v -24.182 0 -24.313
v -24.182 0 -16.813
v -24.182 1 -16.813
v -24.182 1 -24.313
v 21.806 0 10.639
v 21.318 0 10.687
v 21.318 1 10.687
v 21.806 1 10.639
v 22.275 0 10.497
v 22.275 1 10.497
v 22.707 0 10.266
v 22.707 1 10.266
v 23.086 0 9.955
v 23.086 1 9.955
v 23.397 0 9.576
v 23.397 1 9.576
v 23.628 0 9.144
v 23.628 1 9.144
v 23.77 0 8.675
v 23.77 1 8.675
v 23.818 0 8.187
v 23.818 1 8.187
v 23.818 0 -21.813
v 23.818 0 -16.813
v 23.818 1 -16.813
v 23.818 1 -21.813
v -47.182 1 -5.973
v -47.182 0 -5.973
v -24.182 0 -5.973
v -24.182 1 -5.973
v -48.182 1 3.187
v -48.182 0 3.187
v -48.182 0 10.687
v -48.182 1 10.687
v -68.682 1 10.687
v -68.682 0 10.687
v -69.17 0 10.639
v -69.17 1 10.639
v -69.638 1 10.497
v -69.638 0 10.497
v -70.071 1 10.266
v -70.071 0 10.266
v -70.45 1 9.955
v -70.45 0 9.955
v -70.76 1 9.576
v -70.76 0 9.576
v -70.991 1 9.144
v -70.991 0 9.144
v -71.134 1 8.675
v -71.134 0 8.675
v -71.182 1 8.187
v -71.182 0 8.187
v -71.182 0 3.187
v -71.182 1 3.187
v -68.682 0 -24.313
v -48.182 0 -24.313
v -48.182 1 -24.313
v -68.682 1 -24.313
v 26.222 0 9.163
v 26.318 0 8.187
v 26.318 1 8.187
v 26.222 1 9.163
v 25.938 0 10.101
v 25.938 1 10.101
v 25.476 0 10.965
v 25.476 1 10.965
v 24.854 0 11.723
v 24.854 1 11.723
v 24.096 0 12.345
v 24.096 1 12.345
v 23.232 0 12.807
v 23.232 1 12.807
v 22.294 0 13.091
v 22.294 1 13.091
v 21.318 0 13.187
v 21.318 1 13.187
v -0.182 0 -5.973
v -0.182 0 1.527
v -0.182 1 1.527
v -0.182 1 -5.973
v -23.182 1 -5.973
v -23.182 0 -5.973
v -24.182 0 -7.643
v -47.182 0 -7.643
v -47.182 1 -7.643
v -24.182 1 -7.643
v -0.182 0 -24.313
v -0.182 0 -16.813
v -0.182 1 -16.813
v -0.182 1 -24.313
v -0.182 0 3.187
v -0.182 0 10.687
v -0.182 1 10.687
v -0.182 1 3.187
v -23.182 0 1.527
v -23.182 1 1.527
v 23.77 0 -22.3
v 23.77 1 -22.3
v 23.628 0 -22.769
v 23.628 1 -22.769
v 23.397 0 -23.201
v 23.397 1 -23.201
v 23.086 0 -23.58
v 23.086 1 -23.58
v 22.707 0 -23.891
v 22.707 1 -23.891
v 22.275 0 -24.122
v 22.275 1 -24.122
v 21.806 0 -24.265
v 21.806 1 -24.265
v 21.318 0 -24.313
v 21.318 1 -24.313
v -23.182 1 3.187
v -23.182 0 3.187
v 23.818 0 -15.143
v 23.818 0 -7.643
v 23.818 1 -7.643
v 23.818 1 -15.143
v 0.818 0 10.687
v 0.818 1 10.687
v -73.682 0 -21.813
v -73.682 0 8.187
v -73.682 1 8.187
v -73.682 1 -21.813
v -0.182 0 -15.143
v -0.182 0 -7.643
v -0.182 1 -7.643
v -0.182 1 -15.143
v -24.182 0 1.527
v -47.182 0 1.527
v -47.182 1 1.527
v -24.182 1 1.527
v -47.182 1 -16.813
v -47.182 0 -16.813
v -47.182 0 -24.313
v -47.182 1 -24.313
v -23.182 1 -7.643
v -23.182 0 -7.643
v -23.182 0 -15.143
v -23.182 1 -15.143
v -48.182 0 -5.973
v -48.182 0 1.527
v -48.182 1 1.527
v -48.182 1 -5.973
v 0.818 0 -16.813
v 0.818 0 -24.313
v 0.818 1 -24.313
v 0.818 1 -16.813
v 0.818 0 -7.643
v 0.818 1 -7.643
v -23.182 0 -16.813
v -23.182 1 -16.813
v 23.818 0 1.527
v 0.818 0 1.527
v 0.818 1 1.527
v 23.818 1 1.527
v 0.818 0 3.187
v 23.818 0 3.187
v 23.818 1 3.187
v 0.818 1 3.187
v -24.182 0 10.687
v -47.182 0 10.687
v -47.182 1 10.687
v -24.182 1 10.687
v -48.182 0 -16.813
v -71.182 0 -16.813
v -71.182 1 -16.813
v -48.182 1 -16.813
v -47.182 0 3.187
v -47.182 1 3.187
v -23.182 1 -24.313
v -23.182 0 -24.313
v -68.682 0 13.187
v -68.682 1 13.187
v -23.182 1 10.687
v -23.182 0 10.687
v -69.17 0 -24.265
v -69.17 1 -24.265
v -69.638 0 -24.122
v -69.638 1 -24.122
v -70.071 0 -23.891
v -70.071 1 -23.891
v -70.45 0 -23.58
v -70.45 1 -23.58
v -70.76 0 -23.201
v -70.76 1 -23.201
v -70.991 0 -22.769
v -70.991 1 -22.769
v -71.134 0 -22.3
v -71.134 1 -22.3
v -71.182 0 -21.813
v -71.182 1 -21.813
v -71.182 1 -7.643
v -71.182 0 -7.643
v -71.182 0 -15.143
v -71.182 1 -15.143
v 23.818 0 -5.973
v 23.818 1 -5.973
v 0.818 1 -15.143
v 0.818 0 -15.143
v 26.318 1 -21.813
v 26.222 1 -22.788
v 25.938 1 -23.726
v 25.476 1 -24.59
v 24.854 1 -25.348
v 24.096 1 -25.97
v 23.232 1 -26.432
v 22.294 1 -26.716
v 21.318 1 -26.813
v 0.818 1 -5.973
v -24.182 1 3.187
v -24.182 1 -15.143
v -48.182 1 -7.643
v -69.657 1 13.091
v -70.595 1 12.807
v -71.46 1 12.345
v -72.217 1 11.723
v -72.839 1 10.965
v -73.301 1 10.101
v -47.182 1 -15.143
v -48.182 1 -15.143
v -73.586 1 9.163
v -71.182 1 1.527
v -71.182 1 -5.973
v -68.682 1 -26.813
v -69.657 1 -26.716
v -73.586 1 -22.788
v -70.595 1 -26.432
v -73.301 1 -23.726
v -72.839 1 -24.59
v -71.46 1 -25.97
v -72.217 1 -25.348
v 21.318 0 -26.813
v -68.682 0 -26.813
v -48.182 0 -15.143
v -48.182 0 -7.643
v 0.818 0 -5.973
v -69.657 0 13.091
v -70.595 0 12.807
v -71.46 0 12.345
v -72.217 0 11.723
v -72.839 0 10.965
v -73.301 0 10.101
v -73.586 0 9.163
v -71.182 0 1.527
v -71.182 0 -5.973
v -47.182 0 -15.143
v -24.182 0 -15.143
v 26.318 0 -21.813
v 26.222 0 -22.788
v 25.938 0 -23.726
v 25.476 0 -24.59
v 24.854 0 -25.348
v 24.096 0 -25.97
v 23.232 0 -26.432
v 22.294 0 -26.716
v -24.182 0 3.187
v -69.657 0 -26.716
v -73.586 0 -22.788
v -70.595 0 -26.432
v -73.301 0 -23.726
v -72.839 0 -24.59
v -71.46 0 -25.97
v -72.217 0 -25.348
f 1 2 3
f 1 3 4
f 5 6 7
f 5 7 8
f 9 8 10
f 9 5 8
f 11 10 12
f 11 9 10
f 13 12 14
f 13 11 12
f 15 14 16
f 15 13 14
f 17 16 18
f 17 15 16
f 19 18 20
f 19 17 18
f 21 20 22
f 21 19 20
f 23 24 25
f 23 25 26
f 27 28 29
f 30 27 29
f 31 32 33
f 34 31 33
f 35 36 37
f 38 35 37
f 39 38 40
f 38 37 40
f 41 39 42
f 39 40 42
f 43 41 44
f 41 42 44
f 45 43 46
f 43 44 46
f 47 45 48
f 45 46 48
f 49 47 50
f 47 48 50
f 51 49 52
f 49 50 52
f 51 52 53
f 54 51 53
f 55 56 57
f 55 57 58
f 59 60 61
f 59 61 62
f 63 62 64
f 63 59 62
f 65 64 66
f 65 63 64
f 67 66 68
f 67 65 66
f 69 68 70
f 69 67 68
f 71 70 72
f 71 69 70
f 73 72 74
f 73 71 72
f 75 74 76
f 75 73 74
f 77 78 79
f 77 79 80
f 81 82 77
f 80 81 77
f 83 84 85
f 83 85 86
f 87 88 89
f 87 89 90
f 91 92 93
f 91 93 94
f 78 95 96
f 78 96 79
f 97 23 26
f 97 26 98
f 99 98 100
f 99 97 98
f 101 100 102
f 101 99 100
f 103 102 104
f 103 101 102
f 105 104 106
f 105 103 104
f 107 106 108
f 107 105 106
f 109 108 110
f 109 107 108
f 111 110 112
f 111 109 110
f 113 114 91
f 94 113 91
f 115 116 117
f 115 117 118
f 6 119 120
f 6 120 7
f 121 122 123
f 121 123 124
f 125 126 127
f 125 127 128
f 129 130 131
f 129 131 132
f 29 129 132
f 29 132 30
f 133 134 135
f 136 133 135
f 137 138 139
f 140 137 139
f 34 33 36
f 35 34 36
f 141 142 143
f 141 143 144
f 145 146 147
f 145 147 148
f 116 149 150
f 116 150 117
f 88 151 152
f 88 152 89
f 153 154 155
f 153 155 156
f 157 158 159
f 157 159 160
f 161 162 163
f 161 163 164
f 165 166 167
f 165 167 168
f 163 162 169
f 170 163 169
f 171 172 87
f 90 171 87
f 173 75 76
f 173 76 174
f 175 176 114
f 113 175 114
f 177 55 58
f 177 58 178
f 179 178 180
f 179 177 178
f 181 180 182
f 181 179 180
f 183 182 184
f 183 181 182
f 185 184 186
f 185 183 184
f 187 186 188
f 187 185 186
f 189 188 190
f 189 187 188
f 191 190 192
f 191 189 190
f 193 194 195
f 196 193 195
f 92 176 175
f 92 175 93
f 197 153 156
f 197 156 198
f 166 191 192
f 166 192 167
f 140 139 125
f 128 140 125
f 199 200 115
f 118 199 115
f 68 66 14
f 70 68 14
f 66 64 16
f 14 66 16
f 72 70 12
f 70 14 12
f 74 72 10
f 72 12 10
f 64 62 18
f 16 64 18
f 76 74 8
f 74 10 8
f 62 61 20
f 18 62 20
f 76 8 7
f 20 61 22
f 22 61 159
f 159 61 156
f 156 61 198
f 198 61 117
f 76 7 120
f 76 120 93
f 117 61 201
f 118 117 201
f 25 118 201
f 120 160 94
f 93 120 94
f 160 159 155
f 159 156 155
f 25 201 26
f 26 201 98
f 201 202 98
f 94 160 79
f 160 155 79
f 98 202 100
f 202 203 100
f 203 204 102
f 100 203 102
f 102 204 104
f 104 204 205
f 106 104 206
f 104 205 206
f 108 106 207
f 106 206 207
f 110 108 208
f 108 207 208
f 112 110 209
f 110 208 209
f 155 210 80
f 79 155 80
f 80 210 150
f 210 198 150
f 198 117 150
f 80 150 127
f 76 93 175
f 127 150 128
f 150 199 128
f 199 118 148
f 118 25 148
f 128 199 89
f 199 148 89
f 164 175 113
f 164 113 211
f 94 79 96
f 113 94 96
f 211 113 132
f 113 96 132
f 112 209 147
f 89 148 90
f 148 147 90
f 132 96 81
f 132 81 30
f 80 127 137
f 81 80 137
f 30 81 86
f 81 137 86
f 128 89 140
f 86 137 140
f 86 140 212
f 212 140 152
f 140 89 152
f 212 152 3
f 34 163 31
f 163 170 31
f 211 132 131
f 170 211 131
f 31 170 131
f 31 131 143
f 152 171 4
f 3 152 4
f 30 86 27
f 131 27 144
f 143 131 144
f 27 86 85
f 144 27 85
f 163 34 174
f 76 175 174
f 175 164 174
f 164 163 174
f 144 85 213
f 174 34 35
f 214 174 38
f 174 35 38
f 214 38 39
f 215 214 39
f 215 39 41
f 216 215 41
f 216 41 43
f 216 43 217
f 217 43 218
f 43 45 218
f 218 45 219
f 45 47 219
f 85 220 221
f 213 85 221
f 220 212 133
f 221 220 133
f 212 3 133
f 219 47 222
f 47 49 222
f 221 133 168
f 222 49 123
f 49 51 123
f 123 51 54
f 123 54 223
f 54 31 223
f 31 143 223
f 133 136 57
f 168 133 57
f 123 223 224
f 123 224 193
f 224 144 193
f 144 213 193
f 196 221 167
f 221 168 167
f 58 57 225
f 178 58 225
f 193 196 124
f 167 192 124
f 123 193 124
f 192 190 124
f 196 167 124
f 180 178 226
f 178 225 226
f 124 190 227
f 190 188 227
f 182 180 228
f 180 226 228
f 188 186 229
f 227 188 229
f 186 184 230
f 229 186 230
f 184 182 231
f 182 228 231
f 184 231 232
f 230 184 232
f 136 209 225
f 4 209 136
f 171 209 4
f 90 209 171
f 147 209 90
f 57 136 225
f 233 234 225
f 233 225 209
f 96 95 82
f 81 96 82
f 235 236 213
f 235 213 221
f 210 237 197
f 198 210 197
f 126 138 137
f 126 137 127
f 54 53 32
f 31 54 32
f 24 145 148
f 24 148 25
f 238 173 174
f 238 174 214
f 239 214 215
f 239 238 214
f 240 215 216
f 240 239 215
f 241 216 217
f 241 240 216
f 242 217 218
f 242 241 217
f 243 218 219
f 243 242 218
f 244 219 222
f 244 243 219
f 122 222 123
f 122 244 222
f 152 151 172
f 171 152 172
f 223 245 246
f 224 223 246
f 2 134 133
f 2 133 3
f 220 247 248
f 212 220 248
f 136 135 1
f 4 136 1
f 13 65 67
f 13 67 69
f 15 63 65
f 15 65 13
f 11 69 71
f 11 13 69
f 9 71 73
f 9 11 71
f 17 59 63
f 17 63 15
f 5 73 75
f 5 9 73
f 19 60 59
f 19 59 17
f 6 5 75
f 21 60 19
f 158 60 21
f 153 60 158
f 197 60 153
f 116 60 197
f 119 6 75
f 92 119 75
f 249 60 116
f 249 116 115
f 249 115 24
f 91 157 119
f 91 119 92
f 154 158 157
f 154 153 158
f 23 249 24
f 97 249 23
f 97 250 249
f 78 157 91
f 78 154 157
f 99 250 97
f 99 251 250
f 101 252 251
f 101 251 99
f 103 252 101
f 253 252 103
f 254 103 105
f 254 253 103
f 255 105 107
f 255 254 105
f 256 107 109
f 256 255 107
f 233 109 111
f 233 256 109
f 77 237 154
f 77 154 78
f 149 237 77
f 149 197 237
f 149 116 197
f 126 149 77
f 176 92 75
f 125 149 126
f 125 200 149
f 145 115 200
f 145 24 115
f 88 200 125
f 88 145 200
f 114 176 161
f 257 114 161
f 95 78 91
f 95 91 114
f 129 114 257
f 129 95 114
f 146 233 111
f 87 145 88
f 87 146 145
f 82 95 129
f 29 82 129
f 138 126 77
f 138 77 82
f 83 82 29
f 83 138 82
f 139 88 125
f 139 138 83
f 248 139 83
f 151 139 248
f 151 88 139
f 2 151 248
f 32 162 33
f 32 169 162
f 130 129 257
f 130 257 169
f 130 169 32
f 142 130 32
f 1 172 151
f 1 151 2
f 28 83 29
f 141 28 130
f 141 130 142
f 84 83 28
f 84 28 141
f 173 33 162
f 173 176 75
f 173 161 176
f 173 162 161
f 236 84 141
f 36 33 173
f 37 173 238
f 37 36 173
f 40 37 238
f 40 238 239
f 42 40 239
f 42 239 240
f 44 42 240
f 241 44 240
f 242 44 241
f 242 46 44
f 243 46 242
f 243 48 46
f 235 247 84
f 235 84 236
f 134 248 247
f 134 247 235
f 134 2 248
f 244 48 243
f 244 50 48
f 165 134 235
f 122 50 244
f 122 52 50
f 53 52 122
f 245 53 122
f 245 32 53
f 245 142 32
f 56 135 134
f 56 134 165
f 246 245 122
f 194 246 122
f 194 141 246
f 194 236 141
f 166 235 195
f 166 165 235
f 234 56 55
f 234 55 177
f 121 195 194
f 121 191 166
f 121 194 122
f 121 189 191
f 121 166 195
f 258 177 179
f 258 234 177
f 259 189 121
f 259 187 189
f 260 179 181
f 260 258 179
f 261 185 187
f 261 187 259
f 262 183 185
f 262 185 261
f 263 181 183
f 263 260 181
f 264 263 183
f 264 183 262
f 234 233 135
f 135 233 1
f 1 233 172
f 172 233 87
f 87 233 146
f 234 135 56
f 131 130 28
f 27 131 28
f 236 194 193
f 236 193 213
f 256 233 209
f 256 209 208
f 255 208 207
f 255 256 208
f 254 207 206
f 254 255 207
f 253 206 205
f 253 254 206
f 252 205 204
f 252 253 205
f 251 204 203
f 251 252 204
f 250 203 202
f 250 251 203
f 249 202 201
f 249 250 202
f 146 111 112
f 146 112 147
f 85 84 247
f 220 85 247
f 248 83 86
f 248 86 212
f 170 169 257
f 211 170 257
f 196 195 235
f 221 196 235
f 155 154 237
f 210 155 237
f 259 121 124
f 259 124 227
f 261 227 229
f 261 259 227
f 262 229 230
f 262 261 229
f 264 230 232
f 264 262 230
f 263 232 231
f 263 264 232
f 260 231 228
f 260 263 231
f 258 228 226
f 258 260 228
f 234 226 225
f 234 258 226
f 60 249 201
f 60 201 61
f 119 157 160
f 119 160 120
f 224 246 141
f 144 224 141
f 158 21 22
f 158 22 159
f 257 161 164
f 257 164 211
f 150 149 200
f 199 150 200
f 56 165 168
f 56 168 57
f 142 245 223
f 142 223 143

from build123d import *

# Parameters (mm, degrees)
SKETCH1_W           = 23
SKETCH1_H           = 7.5
BOSS_EXTRUDE1_DEPTH = 1


with BuildPart() as part:
    # Sketch1 → Boss-Extrude1 (new body)
    with BuildSketch(Plane(origin=(0, 0, 0), x_dir=(1, 0, 0), z_dir=(0, 1, 0))):
        with BuildLine():
            Line((-68.681780825, 26.812567087), (21.318219175, 26.812567087))
            ThreePointArc((21.318219175, 26.812567087), (24.853753081, 25.348100993), (26.318219175, 21.812567087))
            Line((26.318219175, 21.812567087), (26.318219175, -8.187432913))
            ThreePointArc((26.318219175, -8.187432913), (24.853753081, -11.722966819), (21.318219175, -13.187432913))
            Line((21.318219175, -13.187432913), (-68.681780825, -13.187432913))
            ThreePointArc((-68.681780825, -13.187432913), (-72.217314731, -11.722966819), (-73.681780825, -8.187432913))
            Line((-73.681780825, -8.187432913), (-73.681780825, 21.812567087))
            ThreePointArc((-73.681780825, 21.812567087), (-72.217314731, 25.348100993), (-68.681780825, 26.812567087))
        make_face()
        with BuildLine():
            Line((-71.181780825, 16.812567087), (-48.181780825, 16.812567087))
            Line((-48.181780825, 16.812567087), (-48.181780825, 24.312567087))
            Line((-48.181780825, 24.312567087), (-68.681780825, 24.312567087))
            ThreePointArc((-68.681780825, 24.312567087), (-70.449547778, 23.58033404), (-71.181780825, 21.812567087))
            Line((-71.181780825, 21.812567087), (-71.181780825, 16.812567087))
        make_face(mode=Mode.SUBTRACT)
        with Locations((12.318219175, 11.392567087)):
            Rectangle(SKETCH1_W, SKETCH1_H, mode=Mode.SUBTRACT)
        with BuildLine():
            Line((-71.181780825, -3.187432913), (-48.181780825, -3.187432913))
            Line((-48.181780825, -3.187432913), (-48.181780825, -10.687432913))
            Line((-48.181780825, -10.687432913), (-68.681780825, -10.687432913))
            ThreePointArc((-68.681780825, -10.687432913), (-70.449547778, -9.955199866), (-71.181780825, -8.187432913))
            Line((-71.181780825, -8.187432913), (-71.181780825, -3.187432913))
        make_face(mode=Mode.SUBTRACT)
        with Locations((-35.681780825, 20.562567087)):
            Rectangle(SKETCH1_W, SKETCH1_H, mode=Mode.SUBTRACT)
        with Locations((-11.681780825, 20.562567087)):
            Rectangle(SKETCH1_W, SKETCH1_H, mode=Mode.SUBTRACT)
        with BuildLine():
            Line((0.818219175, 24.312567087), (0.818219175, 16.812567087))
            Line((0.818219175, 16.812567087), (23.818219175, 16.812567087))
            Line((23.818219175, 16.812567087), (23.818219175, 21.812567087))
            ThreePointArc((23.818219175, 21.812567087), (23.085986128, 23.58033404), (21.318219175, 24.312567087))
            Line((21.318219175, 24.312567087), (0.818219175, 24.312567087))
        make_face(mode=Mode.SUBTRACT)
        with Locations((-35.681780825, -6.937432913)):
            Rectangle(SKETCH1_W, SKETCH1_H, mode=Mode.SUBTRACT)
        with Locations((-59.681780825, 11.392567087)):
            Rectangle(SKETCH1_W, SKETCH1_H, mode=Mode.SUBTRACT)
        with Locations((-35.681780825, 11.392567087)):
            Rectangle(SKETCH1_W, SKETCH1_H, mode=Mode.SUBTRACT)
        with Locations((-11.681780825, -6.937432913)):
            Rectangle(SKETCH1_W, SKETCH1_H, mode=Mode.SUBTRACT)
        with BuildLine():
            Line((0.818219175, -10.687432913), (21.318219175, -10.687432913))
            ThreePointArc((21.318219175, -10.687432913), (23.085986128, -9.955199866), (23.818219175, -8.187432913))
            Line((23.818219175, -8.187432913), (23.818219175, -3.187432913))
            Line((23.818219175, -3.187432913), (0.818219175, -3.187432913))
            Line((0.818219175, -3.187432913), (0.818219175, -10.687432913))
        make_face(mode=Mode.SUBTRACT)
        with Locations((-11.681780825, 11.392567087)):
            Rectangle(SKETCH1_W, SKETCH1_H, mode=Mode.SUBTRACT)
        with Locations((-59.681780825, 2.222567087)):
            Rectangle(SKETCH1_W, SKETCH1_H, mode=Mode.SUBTRACT)
        with Locations((-35.681780825, 2.222567087)):
            Rectangle(SKETCH1_W, SKETCH1_H, mode=Mode.SUBTRACT)
        with Locations((-11.681780825, 2.222567087)):
            Rectangle(SKETCH1_W, SKETCH1_H, mode=Mode.SUBTRACT)
        with Locations((12.318219175, 2.222567087)):
            Rectangle(SKETCH1_W, SKETCH1_H, mode=Mode.SUBTRACT)
    extrude(amount=BOSS_EXTRUDE1_DEPTH)


solid = part.part
